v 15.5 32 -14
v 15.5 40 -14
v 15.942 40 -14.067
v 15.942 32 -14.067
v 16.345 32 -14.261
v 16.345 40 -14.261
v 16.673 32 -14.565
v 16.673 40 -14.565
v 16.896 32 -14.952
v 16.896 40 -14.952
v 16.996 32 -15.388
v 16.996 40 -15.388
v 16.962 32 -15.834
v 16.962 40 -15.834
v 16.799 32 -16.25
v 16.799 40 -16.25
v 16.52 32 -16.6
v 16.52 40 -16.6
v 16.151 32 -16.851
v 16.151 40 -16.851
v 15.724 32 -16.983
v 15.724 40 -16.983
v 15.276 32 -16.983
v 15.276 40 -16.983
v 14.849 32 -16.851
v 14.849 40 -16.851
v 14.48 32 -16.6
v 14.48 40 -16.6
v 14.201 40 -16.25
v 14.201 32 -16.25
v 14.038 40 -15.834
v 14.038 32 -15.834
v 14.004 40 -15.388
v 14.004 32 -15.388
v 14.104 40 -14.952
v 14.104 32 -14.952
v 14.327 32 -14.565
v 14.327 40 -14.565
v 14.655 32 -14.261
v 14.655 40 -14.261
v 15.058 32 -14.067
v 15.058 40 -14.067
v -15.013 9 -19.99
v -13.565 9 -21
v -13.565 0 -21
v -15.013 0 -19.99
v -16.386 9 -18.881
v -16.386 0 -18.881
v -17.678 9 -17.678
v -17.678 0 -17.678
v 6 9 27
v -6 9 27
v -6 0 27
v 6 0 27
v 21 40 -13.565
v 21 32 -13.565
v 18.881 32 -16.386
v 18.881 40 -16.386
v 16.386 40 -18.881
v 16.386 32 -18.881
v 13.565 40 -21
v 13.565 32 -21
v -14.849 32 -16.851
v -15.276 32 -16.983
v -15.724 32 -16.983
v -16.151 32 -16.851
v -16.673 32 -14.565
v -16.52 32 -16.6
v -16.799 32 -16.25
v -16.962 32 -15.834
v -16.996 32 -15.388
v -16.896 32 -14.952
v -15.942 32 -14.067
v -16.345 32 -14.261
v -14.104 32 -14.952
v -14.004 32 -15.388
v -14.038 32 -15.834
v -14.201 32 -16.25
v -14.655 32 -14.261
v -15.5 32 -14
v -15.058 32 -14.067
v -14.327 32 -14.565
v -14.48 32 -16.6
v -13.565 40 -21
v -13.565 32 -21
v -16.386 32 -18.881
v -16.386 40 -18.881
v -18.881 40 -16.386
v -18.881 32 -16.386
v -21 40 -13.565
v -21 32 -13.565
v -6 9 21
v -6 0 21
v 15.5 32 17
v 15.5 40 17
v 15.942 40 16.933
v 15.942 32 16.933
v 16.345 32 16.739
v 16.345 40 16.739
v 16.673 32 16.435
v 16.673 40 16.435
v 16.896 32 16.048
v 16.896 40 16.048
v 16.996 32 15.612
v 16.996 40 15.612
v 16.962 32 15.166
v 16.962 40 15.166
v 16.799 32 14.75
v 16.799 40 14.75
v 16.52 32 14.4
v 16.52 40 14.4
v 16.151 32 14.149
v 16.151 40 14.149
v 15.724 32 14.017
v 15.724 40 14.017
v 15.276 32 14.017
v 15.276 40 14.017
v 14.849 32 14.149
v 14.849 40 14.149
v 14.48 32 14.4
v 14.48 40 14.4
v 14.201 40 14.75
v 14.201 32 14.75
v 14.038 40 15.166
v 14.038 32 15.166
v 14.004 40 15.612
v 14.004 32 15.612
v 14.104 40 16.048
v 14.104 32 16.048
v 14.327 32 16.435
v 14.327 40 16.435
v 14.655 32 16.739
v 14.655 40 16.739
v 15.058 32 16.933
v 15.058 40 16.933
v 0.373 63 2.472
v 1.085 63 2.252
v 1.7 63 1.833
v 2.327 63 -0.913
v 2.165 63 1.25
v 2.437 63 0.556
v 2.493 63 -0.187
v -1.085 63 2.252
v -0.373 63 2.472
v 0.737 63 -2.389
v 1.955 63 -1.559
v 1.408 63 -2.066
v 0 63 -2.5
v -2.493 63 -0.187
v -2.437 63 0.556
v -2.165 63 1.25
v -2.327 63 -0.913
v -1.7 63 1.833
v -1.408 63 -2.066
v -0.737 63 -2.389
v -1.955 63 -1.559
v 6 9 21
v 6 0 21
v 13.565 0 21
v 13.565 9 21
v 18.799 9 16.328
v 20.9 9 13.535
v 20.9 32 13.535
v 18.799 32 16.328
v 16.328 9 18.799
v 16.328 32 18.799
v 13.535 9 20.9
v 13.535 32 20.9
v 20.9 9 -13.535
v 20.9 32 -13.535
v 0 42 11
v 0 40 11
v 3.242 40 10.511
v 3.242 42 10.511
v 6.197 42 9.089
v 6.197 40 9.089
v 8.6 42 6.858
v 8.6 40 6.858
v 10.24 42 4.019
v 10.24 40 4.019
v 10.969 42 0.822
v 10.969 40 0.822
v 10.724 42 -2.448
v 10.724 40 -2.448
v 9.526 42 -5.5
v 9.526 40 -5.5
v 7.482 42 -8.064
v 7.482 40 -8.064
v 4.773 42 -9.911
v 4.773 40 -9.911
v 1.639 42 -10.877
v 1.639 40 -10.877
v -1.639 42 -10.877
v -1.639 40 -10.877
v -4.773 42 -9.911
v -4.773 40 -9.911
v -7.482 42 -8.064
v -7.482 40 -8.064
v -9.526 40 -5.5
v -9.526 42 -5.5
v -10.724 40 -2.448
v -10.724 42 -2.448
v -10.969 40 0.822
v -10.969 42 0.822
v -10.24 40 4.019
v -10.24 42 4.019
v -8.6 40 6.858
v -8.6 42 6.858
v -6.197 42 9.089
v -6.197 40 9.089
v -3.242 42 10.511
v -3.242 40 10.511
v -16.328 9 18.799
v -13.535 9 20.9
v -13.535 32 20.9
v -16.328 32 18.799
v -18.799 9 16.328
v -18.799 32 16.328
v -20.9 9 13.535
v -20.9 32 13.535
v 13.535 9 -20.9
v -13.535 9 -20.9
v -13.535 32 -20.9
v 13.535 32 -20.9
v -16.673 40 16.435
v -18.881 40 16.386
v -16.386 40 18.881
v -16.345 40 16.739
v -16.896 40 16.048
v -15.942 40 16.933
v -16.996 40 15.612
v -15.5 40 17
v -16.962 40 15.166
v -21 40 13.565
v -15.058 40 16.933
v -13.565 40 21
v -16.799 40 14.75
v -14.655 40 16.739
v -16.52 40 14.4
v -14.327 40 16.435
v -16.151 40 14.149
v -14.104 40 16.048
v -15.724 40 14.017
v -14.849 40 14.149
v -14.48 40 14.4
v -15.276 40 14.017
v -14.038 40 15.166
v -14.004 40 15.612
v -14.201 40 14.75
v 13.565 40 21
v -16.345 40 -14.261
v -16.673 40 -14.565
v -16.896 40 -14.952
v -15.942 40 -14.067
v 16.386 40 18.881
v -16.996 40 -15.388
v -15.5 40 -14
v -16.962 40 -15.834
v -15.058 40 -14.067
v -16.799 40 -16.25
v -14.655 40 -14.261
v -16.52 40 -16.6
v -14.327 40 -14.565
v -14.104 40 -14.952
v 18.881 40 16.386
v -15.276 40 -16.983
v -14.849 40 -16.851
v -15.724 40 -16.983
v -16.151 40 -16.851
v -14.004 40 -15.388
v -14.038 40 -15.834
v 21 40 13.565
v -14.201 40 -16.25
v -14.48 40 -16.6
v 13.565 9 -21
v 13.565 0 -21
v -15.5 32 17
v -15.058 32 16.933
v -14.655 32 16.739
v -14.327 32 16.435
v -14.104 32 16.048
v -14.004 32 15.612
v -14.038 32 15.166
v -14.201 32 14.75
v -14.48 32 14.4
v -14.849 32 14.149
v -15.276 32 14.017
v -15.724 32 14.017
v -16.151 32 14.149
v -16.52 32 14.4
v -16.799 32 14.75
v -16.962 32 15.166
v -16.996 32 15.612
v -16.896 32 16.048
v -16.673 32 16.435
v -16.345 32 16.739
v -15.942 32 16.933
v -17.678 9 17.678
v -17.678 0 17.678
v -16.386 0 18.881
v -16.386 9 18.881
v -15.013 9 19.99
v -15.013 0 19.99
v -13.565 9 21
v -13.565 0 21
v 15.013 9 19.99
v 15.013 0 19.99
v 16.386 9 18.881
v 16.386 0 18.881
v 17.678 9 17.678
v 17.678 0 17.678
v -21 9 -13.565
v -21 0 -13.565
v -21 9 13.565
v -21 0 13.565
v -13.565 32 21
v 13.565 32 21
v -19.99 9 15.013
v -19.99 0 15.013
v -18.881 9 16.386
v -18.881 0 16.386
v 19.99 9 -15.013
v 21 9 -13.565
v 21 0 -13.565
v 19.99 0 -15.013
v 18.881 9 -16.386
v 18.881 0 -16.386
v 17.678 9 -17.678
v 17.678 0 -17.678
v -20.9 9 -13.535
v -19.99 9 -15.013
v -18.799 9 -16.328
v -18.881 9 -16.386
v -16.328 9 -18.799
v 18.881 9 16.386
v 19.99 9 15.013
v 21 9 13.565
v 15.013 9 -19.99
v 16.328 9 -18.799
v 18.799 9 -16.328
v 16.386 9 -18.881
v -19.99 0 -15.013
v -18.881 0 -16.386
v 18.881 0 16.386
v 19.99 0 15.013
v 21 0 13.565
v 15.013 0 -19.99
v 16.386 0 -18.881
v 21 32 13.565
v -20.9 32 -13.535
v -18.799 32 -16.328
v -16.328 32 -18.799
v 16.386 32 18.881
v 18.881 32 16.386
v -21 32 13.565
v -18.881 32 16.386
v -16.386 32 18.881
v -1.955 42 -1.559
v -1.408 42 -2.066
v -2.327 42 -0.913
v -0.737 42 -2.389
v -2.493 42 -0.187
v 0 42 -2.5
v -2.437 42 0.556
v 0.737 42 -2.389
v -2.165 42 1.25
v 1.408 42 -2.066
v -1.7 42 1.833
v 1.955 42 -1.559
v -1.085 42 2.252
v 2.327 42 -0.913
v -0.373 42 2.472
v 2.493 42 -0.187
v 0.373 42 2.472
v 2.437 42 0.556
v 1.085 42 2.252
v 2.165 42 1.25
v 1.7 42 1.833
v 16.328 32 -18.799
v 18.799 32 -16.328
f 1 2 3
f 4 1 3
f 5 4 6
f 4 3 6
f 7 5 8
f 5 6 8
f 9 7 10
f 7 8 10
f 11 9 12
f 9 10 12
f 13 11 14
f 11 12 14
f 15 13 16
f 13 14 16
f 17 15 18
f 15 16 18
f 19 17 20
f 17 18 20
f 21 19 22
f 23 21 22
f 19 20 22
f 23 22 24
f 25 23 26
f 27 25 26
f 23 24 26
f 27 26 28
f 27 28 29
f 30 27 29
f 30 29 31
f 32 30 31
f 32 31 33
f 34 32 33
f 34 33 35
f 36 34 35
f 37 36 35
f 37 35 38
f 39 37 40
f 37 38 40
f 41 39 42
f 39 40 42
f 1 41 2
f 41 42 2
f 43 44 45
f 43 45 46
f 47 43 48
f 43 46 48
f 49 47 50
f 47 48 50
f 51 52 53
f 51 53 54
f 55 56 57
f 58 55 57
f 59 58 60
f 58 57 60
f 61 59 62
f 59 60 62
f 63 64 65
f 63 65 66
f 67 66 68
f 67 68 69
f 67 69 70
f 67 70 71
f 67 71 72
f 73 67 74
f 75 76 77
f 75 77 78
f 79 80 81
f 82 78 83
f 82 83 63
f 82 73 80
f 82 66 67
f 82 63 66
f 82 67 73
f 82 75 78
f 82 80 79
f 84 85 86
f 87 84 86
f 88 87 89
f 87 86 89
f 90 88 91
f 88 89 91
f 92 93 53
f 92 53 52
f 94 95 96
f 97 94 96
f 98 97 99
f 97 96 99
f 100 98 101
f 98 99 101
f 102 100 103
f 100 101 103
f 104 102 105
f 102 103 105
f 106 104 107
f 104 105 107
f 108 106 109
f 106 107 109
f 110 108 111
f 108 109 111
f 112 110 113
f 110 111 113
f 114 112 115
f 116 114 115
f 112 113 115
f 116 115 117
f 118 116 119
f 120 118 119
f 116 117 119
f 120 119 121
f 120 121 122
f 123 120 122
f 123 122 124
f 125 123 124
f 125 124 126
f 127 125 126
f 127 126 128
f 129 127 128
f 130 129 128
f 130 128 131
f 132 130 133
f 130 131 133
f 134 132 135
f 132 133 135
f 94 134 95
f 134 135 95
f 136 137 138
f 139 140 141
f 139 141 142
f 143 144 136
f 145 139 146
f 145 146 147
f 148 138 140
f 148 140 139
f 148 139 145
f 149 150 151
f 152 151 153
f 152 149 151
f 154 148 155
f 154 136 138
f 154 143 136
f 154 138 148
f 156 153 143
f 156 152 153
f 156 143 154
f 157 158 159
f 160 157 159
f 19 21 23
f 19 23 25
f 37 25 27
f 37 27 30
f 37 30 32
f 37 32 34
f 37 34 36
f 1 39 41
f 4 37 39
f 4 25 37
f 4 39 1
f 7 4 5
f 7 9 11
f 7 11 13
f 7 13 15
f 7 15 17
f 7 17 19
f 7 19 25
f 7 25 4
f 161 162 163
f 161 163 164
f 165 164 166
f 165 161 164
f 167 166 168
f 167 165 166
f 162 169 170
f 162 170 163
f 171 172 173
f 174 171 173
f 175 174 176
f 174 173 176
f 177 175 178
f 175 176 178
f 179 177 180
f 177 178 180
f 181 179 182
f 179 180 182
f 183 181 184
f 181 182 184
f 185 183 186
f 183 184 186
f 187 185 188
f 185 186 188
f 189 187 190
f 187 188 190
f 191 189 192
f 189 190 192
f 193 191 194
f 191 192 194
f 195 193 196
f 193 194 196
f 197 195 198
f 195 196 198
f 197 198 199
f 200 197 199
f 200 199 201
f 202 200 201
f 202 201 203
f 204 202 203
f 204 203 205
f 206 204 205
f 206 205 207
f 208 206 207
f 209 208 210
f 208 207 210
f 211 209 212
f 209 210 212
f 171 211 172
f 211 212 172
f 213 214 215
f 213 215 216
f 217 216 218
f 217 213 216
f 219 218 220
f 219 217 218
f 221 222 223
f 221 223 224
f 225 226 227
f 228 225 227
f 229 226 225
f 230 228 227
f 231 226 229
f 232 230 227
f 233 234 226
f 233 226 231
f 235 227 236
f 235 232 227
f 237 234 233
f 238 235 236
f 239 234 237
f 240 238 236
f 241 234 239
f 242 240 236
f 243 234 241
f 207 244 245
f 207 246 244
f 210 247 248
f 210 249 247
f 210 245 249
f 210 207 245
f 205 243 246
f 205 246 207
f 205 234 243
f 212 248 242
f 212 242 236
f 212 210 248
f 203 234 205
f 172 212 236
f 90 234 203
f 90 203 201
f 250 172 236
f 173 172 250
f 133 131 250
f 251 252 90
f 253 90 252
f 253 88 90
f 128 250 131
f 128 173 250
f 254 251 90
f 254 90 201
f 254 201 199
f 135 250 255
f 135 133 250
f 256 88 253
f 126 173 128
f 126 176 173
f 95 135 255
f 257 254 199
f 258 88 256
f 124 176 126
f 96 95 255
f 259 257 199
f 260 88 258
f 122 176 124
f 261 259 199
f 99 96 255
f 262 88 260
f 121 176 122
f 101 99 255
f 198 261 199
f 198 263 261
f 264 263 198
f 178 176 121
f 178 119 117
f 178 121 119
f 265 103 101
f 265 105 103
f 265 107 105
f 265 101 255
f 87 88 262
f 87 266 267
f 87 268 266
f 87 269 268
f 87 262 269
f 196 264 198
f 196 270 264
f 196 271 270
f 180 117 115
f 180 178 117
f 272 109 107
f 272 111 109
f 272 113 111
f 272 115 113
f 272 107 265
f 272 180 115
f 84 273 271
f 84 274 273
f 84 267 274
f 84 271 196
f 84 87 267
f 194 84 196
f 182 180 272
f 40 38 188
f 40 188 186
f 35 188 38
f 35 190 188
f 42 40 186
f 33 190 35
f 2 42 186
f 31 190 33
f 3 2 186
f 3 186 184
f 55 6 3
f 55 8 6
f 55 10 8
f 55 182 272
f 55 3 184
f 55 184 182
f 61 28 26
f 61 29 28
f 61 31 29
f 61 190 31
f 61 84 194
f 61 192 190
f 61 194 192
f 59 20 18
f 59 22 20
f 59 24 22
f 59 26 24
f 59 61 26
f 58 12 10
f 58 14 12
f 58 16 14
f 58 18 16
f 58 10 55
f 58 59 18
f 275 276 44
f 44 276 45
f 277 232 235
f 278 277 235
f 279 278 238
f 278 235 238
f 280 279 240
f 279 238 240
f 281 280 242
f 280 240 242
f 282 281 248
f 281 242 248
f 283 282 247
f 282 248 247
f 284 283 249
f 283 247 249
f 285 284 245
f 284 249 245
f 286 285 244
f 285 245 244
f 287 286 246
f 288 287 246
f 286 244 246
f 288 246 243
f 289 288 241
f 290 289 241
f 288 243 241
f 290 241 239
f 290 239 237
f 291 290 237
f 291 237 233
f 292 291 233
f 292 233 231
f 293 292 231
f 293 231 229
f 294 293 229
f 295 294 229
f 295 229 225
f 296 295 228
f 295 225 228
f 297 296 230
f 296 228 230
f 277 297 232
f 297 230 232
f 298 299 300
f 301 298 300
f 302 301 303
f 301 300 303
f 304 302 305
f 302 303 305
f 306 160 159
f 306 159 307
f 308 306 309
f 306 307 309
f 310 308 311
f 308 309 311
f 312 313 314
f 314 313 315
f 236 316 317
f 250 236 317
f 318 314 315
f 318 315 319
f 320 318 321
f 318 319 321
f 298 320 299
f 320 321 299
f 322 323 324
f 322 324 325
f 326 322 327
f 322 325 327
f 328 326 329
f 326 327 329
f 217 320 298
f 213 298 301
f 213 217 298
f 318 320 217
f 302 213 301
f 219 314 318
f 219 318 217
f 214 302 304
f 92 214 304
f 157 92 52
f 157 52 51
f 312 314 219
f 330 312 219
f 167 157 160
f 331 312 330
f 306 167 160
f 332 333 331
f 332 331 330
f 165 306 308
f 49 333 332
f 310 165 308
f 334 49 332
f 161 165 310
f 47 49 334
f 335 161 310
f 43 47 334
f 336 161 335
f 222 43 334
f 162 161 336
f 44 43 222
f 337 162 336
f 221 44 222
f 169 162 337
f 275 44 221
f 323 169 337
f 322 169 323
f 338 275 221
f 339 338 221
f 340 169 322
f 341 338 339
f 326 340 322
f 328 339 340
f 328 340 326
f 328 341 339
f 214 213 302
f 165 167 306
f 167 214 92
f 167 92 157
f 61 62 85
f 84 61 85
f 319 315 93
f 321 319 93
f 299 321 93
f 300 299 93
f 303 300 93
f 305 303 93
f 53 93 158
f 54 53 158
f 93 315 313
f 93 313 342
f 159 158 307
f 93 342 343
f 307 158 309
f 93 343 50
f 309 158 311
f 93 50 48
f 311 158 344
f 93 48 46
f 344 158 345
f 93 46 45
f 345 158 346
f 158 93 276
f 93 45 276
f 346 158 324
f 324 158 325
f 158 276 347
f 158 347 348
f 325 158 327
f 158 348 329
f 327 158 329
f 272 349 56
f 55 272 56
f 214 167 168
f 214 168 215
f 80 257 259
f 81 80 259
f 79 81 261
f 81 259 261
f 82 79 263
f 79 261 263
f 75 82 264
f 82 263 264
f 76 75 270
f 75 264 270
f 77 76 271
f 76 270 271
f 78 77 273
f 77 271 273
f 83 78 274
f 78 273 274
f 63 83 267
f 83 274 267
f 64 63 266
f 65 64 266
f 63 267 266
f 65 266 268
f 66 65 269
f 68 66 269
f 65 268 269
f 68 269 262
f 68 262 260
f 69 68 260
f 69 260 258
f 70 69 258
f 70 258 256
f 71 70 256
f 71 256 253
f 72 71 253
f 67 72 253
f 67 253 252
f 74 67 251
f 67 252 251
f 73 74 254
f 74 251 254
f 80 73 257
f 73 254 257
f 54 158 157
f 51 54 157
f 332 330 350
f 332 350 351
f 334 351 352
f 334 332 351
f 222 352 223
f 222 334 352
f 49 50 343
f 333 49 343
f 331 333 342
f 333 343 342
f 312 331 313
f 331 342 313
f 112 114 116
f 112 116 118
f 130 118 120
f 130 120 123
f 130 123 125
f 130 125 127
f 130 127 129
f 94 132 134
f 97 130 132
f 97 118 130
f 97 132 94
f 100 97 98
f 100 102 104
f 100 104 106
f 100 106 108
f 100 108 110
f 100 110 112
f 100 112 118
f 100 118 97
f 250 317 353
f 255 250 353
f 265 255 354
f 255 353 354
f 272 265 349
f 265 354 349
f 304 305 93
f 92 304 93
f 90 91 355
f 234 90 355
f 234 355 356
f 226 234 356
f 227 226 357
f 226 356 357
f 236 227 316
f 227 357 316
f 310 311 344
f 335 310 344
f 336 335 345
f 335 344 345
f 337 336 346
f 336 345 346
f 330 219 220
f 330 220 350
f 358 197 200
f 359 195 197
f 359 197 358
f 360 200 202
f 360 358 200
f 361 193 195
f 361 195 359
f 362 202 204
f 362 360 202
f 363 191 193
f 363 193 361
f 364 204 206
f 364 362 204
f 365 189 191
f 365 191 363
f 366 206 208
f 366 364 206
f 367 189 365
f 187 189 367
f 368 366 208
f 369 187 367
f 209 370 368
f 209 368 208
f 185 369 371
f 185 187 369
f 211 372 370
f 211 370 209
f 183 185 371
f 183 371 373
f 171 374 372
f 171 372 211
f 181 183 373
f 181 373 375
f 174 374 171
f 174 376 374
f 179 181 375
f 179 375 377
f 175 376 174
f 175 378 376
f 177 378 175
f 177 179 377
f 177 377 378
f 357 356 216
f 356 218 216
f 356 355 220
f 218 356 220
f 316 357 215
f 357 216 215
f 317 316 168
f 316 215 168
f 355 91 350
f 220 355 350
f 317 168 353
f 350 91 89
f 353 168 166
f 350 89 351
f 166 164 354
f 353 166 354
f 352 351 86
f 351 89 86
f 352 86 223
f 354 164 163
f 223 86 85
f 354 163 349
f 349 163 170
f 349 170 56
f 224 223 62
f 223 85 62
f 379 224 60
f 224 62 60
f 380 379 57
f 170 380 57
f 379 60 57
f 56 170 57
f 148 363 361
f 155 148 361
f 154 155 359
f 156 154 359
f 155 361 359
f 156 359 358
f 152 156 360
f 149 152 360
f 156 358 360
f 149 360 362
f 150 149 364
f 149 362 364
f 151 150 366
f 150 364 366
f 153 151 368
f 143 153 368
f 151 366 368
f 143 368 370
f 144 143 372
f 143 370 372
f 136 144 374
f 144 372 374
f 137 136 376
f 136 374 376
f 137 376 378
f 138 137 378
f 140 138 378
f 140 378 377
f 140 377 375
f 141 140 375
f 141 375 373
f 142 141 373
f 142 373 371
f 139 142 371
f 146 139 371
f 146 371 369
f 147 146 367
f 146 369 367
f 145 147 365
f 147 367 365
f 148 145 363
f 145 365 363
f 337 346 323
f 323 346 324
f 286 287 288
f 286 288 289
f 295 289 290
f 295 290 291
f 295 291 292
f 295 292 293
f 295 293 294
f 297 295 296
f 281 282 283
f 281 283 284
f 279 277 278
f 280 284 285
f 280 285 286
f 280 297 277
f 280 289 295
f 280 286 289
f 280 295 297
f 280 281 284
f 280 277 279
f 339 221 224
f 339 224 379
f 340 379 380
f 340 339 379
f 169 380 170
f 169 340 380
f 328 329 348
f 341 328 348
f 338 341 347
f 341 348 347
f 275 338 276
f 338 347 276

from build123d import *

# Parameters (mm, degrees)
EXTRUDE_1_DEPTH     = 9
SKETCH_2_W          = 12
SKETCH_2_H          = 9
EXTRUDE_2_DEPTH     = 6
EXTRUDE_3_DEPTH     = 23
EXTRUDE_4_DEPTH     = 8
SKETCH_6_R          = 1.5
CUT_EXTRUDE_1_DEPTH = 8
SKETCH_6_3_R        = 11
EXTRUDE_5_DEPTH     = 2
SKETCH_7_R          = 2.5
EXTRUDE_6_DEPTH     = 21


with BuildPart() as part:
    # Эскиз1 → Бобышка-Вытянуть1 (new body)
    with BuildSketch(Plane(origin=(0, 0, 0), x_dir=(1, 0, 0), z_dir=(0, 1, 0))):
        with BuildLine():
            ThreePointArc((-13.564659966, 21), (-17.67766953, 17.67766953), (-21, 13.564659966))
            Line((-21, 13.564659966), (-21, -13.564659966))
            ThreePointArc((-21, -13.564659966), (-17.67766953, -17.67766953), (-13.564659966, -21))
            Line((-13.564659966, -21), (13.564659966, -21))
            ThreePointArc((13.564659966, -21), (17.67766953, -17.67766953), (21, -13.564659966))
            Line((21, -13.564659966), (21, 13.564659966))
            ThreePointArc((21, 13.564659966), (17.67766953, 17.67766953), (13.564659966, 21))
            Line((13.564659966, 21), (-13.564659966, 21))
        make_face()
    extrude(amount=EXTRUDE_1_DEPTH)

    # Эскиз2 → Бобышка-Вытянуть2 (add)
    with BuildSketch(Plane.XY.offset(21)):
        with Locations((0, 4.5)):
            Rectangle(SKETCH_2_W, SKETCH_2_H)
    extrude(amount=EXTRUDE_2_DEPTH)

    # Эскиз4 → Бобышка-Вытянуть3 (add)
    with BuildSketch(Plane(origin=(0, 9, 0), x_dir=(1, 0, 0), z_dir=(0, 1, 0))):
        with BuildLine():
            Line((-20.9, 13.535139453), (-20.9, -13.535139453))
            ThreePointArc((-20.9, -13.535139453), (-17.606958852, -17.606958852), (-13.535139453, -20.9))
            Line((-13.535139453, -20.9), (13.535139453, -20.9))
            ThreePointArc((13.535139453, -20.9), (17.606958852, -17.606958852), (20.9, -13.535139453))
            Line((20.9, -13.535139453), (20.9, 13.535139453))
            ThreePointArc((20.9, 13.535139453), (17.606958852, 17.606958852), (13.535139453, 20.9))
            Line((13.535139453, 20.9), (-13.535139453, 20.9))
            ThreePointArc((-13.535139453, 20.9), (-17.606958852, 17.606958852), (-20.9, 13.535139453))
        make_face()
    extrude(amount=EXTRUDE_3_DEPTH)

    # Эскиз5 → Бобышка-Вытянуть4 (add)
    with BuildSketch(Plane(origin=(0, 32, 0), x_dir=(1, 0, 0), z_dir=(0, 1, 0))):
        with BuildLine():
            Line((21, -13.564659966), (21, 13.564659966))
            ThreePointArc((21, 13.564659966), (17.67766953, 17.67766953), (13.564659966, 21))
            Line((13.564659966, 21), (-13.564659966, 21))
            ThreePointArc((-13.564659966, 21), (-17.67766953, 17.67766953), (-21, 13.564659966))
            Line((-21, 13.564659966), (-21, -13.564659966))
            ThreePointArc((-21, -13.564659966), (-17.67766953, -17.67766953), (-13.564659966, -21))
            Line((-13.564659966, -21), (13.564659966, -21))
            ThreePointArc((13.564659966, -21), (17.67766953, -17.67766953), (21, -13.564659966))
        make_face()
    extrude(amount=EXTRUDE_4_DEPTH)

    # Эскиз6 → Вырез-Вытянуть1 (cut)
    with BuildSketch(Plane(origin=(0, 40, 0), x_dir=(1, 0, 0), z_dir=(0, 1, 0))):
        with Locations((-15.5, -15.5)):
            Circle(SKETCH_6_R)
        with Locations((-15.5, 15.5)):
            Circle(SKETCH_6_R)
        with Locations((15.5, 15.5)):
            Circle(SKETCH_6_R)
        with Locations((15.5, -15.5)):
            Circle(SKETCH_6_R)
    extrude(amount=-CUT_EXTRUDE_1_DEPTH, mode=Mode.SUBTRACT)

    # Эскиз6<3> → Бобышка-Вытянуть5 (add)
    with BuildSketch(Plane(origin=(0, 40, 0), x_dir=(1, 0, 0), z_dir=(0, 1, 0))):
        Circle(SKETCH_6_3_R)
    extrude(amount=EXTRUDE_5_DEPTH)

    # Эскиз7 → Бобышка-Вытянуть6 (add)
    with BuildSketch(Plane(origin=(0, 42, 0), x_dir=(1, 0, 0), z_dir=(0, 1, 0))):
        Circle(SKETCH_7_R)
    extrude(amount=EXTRUDE_6_DEPTH)


solid = part.part
